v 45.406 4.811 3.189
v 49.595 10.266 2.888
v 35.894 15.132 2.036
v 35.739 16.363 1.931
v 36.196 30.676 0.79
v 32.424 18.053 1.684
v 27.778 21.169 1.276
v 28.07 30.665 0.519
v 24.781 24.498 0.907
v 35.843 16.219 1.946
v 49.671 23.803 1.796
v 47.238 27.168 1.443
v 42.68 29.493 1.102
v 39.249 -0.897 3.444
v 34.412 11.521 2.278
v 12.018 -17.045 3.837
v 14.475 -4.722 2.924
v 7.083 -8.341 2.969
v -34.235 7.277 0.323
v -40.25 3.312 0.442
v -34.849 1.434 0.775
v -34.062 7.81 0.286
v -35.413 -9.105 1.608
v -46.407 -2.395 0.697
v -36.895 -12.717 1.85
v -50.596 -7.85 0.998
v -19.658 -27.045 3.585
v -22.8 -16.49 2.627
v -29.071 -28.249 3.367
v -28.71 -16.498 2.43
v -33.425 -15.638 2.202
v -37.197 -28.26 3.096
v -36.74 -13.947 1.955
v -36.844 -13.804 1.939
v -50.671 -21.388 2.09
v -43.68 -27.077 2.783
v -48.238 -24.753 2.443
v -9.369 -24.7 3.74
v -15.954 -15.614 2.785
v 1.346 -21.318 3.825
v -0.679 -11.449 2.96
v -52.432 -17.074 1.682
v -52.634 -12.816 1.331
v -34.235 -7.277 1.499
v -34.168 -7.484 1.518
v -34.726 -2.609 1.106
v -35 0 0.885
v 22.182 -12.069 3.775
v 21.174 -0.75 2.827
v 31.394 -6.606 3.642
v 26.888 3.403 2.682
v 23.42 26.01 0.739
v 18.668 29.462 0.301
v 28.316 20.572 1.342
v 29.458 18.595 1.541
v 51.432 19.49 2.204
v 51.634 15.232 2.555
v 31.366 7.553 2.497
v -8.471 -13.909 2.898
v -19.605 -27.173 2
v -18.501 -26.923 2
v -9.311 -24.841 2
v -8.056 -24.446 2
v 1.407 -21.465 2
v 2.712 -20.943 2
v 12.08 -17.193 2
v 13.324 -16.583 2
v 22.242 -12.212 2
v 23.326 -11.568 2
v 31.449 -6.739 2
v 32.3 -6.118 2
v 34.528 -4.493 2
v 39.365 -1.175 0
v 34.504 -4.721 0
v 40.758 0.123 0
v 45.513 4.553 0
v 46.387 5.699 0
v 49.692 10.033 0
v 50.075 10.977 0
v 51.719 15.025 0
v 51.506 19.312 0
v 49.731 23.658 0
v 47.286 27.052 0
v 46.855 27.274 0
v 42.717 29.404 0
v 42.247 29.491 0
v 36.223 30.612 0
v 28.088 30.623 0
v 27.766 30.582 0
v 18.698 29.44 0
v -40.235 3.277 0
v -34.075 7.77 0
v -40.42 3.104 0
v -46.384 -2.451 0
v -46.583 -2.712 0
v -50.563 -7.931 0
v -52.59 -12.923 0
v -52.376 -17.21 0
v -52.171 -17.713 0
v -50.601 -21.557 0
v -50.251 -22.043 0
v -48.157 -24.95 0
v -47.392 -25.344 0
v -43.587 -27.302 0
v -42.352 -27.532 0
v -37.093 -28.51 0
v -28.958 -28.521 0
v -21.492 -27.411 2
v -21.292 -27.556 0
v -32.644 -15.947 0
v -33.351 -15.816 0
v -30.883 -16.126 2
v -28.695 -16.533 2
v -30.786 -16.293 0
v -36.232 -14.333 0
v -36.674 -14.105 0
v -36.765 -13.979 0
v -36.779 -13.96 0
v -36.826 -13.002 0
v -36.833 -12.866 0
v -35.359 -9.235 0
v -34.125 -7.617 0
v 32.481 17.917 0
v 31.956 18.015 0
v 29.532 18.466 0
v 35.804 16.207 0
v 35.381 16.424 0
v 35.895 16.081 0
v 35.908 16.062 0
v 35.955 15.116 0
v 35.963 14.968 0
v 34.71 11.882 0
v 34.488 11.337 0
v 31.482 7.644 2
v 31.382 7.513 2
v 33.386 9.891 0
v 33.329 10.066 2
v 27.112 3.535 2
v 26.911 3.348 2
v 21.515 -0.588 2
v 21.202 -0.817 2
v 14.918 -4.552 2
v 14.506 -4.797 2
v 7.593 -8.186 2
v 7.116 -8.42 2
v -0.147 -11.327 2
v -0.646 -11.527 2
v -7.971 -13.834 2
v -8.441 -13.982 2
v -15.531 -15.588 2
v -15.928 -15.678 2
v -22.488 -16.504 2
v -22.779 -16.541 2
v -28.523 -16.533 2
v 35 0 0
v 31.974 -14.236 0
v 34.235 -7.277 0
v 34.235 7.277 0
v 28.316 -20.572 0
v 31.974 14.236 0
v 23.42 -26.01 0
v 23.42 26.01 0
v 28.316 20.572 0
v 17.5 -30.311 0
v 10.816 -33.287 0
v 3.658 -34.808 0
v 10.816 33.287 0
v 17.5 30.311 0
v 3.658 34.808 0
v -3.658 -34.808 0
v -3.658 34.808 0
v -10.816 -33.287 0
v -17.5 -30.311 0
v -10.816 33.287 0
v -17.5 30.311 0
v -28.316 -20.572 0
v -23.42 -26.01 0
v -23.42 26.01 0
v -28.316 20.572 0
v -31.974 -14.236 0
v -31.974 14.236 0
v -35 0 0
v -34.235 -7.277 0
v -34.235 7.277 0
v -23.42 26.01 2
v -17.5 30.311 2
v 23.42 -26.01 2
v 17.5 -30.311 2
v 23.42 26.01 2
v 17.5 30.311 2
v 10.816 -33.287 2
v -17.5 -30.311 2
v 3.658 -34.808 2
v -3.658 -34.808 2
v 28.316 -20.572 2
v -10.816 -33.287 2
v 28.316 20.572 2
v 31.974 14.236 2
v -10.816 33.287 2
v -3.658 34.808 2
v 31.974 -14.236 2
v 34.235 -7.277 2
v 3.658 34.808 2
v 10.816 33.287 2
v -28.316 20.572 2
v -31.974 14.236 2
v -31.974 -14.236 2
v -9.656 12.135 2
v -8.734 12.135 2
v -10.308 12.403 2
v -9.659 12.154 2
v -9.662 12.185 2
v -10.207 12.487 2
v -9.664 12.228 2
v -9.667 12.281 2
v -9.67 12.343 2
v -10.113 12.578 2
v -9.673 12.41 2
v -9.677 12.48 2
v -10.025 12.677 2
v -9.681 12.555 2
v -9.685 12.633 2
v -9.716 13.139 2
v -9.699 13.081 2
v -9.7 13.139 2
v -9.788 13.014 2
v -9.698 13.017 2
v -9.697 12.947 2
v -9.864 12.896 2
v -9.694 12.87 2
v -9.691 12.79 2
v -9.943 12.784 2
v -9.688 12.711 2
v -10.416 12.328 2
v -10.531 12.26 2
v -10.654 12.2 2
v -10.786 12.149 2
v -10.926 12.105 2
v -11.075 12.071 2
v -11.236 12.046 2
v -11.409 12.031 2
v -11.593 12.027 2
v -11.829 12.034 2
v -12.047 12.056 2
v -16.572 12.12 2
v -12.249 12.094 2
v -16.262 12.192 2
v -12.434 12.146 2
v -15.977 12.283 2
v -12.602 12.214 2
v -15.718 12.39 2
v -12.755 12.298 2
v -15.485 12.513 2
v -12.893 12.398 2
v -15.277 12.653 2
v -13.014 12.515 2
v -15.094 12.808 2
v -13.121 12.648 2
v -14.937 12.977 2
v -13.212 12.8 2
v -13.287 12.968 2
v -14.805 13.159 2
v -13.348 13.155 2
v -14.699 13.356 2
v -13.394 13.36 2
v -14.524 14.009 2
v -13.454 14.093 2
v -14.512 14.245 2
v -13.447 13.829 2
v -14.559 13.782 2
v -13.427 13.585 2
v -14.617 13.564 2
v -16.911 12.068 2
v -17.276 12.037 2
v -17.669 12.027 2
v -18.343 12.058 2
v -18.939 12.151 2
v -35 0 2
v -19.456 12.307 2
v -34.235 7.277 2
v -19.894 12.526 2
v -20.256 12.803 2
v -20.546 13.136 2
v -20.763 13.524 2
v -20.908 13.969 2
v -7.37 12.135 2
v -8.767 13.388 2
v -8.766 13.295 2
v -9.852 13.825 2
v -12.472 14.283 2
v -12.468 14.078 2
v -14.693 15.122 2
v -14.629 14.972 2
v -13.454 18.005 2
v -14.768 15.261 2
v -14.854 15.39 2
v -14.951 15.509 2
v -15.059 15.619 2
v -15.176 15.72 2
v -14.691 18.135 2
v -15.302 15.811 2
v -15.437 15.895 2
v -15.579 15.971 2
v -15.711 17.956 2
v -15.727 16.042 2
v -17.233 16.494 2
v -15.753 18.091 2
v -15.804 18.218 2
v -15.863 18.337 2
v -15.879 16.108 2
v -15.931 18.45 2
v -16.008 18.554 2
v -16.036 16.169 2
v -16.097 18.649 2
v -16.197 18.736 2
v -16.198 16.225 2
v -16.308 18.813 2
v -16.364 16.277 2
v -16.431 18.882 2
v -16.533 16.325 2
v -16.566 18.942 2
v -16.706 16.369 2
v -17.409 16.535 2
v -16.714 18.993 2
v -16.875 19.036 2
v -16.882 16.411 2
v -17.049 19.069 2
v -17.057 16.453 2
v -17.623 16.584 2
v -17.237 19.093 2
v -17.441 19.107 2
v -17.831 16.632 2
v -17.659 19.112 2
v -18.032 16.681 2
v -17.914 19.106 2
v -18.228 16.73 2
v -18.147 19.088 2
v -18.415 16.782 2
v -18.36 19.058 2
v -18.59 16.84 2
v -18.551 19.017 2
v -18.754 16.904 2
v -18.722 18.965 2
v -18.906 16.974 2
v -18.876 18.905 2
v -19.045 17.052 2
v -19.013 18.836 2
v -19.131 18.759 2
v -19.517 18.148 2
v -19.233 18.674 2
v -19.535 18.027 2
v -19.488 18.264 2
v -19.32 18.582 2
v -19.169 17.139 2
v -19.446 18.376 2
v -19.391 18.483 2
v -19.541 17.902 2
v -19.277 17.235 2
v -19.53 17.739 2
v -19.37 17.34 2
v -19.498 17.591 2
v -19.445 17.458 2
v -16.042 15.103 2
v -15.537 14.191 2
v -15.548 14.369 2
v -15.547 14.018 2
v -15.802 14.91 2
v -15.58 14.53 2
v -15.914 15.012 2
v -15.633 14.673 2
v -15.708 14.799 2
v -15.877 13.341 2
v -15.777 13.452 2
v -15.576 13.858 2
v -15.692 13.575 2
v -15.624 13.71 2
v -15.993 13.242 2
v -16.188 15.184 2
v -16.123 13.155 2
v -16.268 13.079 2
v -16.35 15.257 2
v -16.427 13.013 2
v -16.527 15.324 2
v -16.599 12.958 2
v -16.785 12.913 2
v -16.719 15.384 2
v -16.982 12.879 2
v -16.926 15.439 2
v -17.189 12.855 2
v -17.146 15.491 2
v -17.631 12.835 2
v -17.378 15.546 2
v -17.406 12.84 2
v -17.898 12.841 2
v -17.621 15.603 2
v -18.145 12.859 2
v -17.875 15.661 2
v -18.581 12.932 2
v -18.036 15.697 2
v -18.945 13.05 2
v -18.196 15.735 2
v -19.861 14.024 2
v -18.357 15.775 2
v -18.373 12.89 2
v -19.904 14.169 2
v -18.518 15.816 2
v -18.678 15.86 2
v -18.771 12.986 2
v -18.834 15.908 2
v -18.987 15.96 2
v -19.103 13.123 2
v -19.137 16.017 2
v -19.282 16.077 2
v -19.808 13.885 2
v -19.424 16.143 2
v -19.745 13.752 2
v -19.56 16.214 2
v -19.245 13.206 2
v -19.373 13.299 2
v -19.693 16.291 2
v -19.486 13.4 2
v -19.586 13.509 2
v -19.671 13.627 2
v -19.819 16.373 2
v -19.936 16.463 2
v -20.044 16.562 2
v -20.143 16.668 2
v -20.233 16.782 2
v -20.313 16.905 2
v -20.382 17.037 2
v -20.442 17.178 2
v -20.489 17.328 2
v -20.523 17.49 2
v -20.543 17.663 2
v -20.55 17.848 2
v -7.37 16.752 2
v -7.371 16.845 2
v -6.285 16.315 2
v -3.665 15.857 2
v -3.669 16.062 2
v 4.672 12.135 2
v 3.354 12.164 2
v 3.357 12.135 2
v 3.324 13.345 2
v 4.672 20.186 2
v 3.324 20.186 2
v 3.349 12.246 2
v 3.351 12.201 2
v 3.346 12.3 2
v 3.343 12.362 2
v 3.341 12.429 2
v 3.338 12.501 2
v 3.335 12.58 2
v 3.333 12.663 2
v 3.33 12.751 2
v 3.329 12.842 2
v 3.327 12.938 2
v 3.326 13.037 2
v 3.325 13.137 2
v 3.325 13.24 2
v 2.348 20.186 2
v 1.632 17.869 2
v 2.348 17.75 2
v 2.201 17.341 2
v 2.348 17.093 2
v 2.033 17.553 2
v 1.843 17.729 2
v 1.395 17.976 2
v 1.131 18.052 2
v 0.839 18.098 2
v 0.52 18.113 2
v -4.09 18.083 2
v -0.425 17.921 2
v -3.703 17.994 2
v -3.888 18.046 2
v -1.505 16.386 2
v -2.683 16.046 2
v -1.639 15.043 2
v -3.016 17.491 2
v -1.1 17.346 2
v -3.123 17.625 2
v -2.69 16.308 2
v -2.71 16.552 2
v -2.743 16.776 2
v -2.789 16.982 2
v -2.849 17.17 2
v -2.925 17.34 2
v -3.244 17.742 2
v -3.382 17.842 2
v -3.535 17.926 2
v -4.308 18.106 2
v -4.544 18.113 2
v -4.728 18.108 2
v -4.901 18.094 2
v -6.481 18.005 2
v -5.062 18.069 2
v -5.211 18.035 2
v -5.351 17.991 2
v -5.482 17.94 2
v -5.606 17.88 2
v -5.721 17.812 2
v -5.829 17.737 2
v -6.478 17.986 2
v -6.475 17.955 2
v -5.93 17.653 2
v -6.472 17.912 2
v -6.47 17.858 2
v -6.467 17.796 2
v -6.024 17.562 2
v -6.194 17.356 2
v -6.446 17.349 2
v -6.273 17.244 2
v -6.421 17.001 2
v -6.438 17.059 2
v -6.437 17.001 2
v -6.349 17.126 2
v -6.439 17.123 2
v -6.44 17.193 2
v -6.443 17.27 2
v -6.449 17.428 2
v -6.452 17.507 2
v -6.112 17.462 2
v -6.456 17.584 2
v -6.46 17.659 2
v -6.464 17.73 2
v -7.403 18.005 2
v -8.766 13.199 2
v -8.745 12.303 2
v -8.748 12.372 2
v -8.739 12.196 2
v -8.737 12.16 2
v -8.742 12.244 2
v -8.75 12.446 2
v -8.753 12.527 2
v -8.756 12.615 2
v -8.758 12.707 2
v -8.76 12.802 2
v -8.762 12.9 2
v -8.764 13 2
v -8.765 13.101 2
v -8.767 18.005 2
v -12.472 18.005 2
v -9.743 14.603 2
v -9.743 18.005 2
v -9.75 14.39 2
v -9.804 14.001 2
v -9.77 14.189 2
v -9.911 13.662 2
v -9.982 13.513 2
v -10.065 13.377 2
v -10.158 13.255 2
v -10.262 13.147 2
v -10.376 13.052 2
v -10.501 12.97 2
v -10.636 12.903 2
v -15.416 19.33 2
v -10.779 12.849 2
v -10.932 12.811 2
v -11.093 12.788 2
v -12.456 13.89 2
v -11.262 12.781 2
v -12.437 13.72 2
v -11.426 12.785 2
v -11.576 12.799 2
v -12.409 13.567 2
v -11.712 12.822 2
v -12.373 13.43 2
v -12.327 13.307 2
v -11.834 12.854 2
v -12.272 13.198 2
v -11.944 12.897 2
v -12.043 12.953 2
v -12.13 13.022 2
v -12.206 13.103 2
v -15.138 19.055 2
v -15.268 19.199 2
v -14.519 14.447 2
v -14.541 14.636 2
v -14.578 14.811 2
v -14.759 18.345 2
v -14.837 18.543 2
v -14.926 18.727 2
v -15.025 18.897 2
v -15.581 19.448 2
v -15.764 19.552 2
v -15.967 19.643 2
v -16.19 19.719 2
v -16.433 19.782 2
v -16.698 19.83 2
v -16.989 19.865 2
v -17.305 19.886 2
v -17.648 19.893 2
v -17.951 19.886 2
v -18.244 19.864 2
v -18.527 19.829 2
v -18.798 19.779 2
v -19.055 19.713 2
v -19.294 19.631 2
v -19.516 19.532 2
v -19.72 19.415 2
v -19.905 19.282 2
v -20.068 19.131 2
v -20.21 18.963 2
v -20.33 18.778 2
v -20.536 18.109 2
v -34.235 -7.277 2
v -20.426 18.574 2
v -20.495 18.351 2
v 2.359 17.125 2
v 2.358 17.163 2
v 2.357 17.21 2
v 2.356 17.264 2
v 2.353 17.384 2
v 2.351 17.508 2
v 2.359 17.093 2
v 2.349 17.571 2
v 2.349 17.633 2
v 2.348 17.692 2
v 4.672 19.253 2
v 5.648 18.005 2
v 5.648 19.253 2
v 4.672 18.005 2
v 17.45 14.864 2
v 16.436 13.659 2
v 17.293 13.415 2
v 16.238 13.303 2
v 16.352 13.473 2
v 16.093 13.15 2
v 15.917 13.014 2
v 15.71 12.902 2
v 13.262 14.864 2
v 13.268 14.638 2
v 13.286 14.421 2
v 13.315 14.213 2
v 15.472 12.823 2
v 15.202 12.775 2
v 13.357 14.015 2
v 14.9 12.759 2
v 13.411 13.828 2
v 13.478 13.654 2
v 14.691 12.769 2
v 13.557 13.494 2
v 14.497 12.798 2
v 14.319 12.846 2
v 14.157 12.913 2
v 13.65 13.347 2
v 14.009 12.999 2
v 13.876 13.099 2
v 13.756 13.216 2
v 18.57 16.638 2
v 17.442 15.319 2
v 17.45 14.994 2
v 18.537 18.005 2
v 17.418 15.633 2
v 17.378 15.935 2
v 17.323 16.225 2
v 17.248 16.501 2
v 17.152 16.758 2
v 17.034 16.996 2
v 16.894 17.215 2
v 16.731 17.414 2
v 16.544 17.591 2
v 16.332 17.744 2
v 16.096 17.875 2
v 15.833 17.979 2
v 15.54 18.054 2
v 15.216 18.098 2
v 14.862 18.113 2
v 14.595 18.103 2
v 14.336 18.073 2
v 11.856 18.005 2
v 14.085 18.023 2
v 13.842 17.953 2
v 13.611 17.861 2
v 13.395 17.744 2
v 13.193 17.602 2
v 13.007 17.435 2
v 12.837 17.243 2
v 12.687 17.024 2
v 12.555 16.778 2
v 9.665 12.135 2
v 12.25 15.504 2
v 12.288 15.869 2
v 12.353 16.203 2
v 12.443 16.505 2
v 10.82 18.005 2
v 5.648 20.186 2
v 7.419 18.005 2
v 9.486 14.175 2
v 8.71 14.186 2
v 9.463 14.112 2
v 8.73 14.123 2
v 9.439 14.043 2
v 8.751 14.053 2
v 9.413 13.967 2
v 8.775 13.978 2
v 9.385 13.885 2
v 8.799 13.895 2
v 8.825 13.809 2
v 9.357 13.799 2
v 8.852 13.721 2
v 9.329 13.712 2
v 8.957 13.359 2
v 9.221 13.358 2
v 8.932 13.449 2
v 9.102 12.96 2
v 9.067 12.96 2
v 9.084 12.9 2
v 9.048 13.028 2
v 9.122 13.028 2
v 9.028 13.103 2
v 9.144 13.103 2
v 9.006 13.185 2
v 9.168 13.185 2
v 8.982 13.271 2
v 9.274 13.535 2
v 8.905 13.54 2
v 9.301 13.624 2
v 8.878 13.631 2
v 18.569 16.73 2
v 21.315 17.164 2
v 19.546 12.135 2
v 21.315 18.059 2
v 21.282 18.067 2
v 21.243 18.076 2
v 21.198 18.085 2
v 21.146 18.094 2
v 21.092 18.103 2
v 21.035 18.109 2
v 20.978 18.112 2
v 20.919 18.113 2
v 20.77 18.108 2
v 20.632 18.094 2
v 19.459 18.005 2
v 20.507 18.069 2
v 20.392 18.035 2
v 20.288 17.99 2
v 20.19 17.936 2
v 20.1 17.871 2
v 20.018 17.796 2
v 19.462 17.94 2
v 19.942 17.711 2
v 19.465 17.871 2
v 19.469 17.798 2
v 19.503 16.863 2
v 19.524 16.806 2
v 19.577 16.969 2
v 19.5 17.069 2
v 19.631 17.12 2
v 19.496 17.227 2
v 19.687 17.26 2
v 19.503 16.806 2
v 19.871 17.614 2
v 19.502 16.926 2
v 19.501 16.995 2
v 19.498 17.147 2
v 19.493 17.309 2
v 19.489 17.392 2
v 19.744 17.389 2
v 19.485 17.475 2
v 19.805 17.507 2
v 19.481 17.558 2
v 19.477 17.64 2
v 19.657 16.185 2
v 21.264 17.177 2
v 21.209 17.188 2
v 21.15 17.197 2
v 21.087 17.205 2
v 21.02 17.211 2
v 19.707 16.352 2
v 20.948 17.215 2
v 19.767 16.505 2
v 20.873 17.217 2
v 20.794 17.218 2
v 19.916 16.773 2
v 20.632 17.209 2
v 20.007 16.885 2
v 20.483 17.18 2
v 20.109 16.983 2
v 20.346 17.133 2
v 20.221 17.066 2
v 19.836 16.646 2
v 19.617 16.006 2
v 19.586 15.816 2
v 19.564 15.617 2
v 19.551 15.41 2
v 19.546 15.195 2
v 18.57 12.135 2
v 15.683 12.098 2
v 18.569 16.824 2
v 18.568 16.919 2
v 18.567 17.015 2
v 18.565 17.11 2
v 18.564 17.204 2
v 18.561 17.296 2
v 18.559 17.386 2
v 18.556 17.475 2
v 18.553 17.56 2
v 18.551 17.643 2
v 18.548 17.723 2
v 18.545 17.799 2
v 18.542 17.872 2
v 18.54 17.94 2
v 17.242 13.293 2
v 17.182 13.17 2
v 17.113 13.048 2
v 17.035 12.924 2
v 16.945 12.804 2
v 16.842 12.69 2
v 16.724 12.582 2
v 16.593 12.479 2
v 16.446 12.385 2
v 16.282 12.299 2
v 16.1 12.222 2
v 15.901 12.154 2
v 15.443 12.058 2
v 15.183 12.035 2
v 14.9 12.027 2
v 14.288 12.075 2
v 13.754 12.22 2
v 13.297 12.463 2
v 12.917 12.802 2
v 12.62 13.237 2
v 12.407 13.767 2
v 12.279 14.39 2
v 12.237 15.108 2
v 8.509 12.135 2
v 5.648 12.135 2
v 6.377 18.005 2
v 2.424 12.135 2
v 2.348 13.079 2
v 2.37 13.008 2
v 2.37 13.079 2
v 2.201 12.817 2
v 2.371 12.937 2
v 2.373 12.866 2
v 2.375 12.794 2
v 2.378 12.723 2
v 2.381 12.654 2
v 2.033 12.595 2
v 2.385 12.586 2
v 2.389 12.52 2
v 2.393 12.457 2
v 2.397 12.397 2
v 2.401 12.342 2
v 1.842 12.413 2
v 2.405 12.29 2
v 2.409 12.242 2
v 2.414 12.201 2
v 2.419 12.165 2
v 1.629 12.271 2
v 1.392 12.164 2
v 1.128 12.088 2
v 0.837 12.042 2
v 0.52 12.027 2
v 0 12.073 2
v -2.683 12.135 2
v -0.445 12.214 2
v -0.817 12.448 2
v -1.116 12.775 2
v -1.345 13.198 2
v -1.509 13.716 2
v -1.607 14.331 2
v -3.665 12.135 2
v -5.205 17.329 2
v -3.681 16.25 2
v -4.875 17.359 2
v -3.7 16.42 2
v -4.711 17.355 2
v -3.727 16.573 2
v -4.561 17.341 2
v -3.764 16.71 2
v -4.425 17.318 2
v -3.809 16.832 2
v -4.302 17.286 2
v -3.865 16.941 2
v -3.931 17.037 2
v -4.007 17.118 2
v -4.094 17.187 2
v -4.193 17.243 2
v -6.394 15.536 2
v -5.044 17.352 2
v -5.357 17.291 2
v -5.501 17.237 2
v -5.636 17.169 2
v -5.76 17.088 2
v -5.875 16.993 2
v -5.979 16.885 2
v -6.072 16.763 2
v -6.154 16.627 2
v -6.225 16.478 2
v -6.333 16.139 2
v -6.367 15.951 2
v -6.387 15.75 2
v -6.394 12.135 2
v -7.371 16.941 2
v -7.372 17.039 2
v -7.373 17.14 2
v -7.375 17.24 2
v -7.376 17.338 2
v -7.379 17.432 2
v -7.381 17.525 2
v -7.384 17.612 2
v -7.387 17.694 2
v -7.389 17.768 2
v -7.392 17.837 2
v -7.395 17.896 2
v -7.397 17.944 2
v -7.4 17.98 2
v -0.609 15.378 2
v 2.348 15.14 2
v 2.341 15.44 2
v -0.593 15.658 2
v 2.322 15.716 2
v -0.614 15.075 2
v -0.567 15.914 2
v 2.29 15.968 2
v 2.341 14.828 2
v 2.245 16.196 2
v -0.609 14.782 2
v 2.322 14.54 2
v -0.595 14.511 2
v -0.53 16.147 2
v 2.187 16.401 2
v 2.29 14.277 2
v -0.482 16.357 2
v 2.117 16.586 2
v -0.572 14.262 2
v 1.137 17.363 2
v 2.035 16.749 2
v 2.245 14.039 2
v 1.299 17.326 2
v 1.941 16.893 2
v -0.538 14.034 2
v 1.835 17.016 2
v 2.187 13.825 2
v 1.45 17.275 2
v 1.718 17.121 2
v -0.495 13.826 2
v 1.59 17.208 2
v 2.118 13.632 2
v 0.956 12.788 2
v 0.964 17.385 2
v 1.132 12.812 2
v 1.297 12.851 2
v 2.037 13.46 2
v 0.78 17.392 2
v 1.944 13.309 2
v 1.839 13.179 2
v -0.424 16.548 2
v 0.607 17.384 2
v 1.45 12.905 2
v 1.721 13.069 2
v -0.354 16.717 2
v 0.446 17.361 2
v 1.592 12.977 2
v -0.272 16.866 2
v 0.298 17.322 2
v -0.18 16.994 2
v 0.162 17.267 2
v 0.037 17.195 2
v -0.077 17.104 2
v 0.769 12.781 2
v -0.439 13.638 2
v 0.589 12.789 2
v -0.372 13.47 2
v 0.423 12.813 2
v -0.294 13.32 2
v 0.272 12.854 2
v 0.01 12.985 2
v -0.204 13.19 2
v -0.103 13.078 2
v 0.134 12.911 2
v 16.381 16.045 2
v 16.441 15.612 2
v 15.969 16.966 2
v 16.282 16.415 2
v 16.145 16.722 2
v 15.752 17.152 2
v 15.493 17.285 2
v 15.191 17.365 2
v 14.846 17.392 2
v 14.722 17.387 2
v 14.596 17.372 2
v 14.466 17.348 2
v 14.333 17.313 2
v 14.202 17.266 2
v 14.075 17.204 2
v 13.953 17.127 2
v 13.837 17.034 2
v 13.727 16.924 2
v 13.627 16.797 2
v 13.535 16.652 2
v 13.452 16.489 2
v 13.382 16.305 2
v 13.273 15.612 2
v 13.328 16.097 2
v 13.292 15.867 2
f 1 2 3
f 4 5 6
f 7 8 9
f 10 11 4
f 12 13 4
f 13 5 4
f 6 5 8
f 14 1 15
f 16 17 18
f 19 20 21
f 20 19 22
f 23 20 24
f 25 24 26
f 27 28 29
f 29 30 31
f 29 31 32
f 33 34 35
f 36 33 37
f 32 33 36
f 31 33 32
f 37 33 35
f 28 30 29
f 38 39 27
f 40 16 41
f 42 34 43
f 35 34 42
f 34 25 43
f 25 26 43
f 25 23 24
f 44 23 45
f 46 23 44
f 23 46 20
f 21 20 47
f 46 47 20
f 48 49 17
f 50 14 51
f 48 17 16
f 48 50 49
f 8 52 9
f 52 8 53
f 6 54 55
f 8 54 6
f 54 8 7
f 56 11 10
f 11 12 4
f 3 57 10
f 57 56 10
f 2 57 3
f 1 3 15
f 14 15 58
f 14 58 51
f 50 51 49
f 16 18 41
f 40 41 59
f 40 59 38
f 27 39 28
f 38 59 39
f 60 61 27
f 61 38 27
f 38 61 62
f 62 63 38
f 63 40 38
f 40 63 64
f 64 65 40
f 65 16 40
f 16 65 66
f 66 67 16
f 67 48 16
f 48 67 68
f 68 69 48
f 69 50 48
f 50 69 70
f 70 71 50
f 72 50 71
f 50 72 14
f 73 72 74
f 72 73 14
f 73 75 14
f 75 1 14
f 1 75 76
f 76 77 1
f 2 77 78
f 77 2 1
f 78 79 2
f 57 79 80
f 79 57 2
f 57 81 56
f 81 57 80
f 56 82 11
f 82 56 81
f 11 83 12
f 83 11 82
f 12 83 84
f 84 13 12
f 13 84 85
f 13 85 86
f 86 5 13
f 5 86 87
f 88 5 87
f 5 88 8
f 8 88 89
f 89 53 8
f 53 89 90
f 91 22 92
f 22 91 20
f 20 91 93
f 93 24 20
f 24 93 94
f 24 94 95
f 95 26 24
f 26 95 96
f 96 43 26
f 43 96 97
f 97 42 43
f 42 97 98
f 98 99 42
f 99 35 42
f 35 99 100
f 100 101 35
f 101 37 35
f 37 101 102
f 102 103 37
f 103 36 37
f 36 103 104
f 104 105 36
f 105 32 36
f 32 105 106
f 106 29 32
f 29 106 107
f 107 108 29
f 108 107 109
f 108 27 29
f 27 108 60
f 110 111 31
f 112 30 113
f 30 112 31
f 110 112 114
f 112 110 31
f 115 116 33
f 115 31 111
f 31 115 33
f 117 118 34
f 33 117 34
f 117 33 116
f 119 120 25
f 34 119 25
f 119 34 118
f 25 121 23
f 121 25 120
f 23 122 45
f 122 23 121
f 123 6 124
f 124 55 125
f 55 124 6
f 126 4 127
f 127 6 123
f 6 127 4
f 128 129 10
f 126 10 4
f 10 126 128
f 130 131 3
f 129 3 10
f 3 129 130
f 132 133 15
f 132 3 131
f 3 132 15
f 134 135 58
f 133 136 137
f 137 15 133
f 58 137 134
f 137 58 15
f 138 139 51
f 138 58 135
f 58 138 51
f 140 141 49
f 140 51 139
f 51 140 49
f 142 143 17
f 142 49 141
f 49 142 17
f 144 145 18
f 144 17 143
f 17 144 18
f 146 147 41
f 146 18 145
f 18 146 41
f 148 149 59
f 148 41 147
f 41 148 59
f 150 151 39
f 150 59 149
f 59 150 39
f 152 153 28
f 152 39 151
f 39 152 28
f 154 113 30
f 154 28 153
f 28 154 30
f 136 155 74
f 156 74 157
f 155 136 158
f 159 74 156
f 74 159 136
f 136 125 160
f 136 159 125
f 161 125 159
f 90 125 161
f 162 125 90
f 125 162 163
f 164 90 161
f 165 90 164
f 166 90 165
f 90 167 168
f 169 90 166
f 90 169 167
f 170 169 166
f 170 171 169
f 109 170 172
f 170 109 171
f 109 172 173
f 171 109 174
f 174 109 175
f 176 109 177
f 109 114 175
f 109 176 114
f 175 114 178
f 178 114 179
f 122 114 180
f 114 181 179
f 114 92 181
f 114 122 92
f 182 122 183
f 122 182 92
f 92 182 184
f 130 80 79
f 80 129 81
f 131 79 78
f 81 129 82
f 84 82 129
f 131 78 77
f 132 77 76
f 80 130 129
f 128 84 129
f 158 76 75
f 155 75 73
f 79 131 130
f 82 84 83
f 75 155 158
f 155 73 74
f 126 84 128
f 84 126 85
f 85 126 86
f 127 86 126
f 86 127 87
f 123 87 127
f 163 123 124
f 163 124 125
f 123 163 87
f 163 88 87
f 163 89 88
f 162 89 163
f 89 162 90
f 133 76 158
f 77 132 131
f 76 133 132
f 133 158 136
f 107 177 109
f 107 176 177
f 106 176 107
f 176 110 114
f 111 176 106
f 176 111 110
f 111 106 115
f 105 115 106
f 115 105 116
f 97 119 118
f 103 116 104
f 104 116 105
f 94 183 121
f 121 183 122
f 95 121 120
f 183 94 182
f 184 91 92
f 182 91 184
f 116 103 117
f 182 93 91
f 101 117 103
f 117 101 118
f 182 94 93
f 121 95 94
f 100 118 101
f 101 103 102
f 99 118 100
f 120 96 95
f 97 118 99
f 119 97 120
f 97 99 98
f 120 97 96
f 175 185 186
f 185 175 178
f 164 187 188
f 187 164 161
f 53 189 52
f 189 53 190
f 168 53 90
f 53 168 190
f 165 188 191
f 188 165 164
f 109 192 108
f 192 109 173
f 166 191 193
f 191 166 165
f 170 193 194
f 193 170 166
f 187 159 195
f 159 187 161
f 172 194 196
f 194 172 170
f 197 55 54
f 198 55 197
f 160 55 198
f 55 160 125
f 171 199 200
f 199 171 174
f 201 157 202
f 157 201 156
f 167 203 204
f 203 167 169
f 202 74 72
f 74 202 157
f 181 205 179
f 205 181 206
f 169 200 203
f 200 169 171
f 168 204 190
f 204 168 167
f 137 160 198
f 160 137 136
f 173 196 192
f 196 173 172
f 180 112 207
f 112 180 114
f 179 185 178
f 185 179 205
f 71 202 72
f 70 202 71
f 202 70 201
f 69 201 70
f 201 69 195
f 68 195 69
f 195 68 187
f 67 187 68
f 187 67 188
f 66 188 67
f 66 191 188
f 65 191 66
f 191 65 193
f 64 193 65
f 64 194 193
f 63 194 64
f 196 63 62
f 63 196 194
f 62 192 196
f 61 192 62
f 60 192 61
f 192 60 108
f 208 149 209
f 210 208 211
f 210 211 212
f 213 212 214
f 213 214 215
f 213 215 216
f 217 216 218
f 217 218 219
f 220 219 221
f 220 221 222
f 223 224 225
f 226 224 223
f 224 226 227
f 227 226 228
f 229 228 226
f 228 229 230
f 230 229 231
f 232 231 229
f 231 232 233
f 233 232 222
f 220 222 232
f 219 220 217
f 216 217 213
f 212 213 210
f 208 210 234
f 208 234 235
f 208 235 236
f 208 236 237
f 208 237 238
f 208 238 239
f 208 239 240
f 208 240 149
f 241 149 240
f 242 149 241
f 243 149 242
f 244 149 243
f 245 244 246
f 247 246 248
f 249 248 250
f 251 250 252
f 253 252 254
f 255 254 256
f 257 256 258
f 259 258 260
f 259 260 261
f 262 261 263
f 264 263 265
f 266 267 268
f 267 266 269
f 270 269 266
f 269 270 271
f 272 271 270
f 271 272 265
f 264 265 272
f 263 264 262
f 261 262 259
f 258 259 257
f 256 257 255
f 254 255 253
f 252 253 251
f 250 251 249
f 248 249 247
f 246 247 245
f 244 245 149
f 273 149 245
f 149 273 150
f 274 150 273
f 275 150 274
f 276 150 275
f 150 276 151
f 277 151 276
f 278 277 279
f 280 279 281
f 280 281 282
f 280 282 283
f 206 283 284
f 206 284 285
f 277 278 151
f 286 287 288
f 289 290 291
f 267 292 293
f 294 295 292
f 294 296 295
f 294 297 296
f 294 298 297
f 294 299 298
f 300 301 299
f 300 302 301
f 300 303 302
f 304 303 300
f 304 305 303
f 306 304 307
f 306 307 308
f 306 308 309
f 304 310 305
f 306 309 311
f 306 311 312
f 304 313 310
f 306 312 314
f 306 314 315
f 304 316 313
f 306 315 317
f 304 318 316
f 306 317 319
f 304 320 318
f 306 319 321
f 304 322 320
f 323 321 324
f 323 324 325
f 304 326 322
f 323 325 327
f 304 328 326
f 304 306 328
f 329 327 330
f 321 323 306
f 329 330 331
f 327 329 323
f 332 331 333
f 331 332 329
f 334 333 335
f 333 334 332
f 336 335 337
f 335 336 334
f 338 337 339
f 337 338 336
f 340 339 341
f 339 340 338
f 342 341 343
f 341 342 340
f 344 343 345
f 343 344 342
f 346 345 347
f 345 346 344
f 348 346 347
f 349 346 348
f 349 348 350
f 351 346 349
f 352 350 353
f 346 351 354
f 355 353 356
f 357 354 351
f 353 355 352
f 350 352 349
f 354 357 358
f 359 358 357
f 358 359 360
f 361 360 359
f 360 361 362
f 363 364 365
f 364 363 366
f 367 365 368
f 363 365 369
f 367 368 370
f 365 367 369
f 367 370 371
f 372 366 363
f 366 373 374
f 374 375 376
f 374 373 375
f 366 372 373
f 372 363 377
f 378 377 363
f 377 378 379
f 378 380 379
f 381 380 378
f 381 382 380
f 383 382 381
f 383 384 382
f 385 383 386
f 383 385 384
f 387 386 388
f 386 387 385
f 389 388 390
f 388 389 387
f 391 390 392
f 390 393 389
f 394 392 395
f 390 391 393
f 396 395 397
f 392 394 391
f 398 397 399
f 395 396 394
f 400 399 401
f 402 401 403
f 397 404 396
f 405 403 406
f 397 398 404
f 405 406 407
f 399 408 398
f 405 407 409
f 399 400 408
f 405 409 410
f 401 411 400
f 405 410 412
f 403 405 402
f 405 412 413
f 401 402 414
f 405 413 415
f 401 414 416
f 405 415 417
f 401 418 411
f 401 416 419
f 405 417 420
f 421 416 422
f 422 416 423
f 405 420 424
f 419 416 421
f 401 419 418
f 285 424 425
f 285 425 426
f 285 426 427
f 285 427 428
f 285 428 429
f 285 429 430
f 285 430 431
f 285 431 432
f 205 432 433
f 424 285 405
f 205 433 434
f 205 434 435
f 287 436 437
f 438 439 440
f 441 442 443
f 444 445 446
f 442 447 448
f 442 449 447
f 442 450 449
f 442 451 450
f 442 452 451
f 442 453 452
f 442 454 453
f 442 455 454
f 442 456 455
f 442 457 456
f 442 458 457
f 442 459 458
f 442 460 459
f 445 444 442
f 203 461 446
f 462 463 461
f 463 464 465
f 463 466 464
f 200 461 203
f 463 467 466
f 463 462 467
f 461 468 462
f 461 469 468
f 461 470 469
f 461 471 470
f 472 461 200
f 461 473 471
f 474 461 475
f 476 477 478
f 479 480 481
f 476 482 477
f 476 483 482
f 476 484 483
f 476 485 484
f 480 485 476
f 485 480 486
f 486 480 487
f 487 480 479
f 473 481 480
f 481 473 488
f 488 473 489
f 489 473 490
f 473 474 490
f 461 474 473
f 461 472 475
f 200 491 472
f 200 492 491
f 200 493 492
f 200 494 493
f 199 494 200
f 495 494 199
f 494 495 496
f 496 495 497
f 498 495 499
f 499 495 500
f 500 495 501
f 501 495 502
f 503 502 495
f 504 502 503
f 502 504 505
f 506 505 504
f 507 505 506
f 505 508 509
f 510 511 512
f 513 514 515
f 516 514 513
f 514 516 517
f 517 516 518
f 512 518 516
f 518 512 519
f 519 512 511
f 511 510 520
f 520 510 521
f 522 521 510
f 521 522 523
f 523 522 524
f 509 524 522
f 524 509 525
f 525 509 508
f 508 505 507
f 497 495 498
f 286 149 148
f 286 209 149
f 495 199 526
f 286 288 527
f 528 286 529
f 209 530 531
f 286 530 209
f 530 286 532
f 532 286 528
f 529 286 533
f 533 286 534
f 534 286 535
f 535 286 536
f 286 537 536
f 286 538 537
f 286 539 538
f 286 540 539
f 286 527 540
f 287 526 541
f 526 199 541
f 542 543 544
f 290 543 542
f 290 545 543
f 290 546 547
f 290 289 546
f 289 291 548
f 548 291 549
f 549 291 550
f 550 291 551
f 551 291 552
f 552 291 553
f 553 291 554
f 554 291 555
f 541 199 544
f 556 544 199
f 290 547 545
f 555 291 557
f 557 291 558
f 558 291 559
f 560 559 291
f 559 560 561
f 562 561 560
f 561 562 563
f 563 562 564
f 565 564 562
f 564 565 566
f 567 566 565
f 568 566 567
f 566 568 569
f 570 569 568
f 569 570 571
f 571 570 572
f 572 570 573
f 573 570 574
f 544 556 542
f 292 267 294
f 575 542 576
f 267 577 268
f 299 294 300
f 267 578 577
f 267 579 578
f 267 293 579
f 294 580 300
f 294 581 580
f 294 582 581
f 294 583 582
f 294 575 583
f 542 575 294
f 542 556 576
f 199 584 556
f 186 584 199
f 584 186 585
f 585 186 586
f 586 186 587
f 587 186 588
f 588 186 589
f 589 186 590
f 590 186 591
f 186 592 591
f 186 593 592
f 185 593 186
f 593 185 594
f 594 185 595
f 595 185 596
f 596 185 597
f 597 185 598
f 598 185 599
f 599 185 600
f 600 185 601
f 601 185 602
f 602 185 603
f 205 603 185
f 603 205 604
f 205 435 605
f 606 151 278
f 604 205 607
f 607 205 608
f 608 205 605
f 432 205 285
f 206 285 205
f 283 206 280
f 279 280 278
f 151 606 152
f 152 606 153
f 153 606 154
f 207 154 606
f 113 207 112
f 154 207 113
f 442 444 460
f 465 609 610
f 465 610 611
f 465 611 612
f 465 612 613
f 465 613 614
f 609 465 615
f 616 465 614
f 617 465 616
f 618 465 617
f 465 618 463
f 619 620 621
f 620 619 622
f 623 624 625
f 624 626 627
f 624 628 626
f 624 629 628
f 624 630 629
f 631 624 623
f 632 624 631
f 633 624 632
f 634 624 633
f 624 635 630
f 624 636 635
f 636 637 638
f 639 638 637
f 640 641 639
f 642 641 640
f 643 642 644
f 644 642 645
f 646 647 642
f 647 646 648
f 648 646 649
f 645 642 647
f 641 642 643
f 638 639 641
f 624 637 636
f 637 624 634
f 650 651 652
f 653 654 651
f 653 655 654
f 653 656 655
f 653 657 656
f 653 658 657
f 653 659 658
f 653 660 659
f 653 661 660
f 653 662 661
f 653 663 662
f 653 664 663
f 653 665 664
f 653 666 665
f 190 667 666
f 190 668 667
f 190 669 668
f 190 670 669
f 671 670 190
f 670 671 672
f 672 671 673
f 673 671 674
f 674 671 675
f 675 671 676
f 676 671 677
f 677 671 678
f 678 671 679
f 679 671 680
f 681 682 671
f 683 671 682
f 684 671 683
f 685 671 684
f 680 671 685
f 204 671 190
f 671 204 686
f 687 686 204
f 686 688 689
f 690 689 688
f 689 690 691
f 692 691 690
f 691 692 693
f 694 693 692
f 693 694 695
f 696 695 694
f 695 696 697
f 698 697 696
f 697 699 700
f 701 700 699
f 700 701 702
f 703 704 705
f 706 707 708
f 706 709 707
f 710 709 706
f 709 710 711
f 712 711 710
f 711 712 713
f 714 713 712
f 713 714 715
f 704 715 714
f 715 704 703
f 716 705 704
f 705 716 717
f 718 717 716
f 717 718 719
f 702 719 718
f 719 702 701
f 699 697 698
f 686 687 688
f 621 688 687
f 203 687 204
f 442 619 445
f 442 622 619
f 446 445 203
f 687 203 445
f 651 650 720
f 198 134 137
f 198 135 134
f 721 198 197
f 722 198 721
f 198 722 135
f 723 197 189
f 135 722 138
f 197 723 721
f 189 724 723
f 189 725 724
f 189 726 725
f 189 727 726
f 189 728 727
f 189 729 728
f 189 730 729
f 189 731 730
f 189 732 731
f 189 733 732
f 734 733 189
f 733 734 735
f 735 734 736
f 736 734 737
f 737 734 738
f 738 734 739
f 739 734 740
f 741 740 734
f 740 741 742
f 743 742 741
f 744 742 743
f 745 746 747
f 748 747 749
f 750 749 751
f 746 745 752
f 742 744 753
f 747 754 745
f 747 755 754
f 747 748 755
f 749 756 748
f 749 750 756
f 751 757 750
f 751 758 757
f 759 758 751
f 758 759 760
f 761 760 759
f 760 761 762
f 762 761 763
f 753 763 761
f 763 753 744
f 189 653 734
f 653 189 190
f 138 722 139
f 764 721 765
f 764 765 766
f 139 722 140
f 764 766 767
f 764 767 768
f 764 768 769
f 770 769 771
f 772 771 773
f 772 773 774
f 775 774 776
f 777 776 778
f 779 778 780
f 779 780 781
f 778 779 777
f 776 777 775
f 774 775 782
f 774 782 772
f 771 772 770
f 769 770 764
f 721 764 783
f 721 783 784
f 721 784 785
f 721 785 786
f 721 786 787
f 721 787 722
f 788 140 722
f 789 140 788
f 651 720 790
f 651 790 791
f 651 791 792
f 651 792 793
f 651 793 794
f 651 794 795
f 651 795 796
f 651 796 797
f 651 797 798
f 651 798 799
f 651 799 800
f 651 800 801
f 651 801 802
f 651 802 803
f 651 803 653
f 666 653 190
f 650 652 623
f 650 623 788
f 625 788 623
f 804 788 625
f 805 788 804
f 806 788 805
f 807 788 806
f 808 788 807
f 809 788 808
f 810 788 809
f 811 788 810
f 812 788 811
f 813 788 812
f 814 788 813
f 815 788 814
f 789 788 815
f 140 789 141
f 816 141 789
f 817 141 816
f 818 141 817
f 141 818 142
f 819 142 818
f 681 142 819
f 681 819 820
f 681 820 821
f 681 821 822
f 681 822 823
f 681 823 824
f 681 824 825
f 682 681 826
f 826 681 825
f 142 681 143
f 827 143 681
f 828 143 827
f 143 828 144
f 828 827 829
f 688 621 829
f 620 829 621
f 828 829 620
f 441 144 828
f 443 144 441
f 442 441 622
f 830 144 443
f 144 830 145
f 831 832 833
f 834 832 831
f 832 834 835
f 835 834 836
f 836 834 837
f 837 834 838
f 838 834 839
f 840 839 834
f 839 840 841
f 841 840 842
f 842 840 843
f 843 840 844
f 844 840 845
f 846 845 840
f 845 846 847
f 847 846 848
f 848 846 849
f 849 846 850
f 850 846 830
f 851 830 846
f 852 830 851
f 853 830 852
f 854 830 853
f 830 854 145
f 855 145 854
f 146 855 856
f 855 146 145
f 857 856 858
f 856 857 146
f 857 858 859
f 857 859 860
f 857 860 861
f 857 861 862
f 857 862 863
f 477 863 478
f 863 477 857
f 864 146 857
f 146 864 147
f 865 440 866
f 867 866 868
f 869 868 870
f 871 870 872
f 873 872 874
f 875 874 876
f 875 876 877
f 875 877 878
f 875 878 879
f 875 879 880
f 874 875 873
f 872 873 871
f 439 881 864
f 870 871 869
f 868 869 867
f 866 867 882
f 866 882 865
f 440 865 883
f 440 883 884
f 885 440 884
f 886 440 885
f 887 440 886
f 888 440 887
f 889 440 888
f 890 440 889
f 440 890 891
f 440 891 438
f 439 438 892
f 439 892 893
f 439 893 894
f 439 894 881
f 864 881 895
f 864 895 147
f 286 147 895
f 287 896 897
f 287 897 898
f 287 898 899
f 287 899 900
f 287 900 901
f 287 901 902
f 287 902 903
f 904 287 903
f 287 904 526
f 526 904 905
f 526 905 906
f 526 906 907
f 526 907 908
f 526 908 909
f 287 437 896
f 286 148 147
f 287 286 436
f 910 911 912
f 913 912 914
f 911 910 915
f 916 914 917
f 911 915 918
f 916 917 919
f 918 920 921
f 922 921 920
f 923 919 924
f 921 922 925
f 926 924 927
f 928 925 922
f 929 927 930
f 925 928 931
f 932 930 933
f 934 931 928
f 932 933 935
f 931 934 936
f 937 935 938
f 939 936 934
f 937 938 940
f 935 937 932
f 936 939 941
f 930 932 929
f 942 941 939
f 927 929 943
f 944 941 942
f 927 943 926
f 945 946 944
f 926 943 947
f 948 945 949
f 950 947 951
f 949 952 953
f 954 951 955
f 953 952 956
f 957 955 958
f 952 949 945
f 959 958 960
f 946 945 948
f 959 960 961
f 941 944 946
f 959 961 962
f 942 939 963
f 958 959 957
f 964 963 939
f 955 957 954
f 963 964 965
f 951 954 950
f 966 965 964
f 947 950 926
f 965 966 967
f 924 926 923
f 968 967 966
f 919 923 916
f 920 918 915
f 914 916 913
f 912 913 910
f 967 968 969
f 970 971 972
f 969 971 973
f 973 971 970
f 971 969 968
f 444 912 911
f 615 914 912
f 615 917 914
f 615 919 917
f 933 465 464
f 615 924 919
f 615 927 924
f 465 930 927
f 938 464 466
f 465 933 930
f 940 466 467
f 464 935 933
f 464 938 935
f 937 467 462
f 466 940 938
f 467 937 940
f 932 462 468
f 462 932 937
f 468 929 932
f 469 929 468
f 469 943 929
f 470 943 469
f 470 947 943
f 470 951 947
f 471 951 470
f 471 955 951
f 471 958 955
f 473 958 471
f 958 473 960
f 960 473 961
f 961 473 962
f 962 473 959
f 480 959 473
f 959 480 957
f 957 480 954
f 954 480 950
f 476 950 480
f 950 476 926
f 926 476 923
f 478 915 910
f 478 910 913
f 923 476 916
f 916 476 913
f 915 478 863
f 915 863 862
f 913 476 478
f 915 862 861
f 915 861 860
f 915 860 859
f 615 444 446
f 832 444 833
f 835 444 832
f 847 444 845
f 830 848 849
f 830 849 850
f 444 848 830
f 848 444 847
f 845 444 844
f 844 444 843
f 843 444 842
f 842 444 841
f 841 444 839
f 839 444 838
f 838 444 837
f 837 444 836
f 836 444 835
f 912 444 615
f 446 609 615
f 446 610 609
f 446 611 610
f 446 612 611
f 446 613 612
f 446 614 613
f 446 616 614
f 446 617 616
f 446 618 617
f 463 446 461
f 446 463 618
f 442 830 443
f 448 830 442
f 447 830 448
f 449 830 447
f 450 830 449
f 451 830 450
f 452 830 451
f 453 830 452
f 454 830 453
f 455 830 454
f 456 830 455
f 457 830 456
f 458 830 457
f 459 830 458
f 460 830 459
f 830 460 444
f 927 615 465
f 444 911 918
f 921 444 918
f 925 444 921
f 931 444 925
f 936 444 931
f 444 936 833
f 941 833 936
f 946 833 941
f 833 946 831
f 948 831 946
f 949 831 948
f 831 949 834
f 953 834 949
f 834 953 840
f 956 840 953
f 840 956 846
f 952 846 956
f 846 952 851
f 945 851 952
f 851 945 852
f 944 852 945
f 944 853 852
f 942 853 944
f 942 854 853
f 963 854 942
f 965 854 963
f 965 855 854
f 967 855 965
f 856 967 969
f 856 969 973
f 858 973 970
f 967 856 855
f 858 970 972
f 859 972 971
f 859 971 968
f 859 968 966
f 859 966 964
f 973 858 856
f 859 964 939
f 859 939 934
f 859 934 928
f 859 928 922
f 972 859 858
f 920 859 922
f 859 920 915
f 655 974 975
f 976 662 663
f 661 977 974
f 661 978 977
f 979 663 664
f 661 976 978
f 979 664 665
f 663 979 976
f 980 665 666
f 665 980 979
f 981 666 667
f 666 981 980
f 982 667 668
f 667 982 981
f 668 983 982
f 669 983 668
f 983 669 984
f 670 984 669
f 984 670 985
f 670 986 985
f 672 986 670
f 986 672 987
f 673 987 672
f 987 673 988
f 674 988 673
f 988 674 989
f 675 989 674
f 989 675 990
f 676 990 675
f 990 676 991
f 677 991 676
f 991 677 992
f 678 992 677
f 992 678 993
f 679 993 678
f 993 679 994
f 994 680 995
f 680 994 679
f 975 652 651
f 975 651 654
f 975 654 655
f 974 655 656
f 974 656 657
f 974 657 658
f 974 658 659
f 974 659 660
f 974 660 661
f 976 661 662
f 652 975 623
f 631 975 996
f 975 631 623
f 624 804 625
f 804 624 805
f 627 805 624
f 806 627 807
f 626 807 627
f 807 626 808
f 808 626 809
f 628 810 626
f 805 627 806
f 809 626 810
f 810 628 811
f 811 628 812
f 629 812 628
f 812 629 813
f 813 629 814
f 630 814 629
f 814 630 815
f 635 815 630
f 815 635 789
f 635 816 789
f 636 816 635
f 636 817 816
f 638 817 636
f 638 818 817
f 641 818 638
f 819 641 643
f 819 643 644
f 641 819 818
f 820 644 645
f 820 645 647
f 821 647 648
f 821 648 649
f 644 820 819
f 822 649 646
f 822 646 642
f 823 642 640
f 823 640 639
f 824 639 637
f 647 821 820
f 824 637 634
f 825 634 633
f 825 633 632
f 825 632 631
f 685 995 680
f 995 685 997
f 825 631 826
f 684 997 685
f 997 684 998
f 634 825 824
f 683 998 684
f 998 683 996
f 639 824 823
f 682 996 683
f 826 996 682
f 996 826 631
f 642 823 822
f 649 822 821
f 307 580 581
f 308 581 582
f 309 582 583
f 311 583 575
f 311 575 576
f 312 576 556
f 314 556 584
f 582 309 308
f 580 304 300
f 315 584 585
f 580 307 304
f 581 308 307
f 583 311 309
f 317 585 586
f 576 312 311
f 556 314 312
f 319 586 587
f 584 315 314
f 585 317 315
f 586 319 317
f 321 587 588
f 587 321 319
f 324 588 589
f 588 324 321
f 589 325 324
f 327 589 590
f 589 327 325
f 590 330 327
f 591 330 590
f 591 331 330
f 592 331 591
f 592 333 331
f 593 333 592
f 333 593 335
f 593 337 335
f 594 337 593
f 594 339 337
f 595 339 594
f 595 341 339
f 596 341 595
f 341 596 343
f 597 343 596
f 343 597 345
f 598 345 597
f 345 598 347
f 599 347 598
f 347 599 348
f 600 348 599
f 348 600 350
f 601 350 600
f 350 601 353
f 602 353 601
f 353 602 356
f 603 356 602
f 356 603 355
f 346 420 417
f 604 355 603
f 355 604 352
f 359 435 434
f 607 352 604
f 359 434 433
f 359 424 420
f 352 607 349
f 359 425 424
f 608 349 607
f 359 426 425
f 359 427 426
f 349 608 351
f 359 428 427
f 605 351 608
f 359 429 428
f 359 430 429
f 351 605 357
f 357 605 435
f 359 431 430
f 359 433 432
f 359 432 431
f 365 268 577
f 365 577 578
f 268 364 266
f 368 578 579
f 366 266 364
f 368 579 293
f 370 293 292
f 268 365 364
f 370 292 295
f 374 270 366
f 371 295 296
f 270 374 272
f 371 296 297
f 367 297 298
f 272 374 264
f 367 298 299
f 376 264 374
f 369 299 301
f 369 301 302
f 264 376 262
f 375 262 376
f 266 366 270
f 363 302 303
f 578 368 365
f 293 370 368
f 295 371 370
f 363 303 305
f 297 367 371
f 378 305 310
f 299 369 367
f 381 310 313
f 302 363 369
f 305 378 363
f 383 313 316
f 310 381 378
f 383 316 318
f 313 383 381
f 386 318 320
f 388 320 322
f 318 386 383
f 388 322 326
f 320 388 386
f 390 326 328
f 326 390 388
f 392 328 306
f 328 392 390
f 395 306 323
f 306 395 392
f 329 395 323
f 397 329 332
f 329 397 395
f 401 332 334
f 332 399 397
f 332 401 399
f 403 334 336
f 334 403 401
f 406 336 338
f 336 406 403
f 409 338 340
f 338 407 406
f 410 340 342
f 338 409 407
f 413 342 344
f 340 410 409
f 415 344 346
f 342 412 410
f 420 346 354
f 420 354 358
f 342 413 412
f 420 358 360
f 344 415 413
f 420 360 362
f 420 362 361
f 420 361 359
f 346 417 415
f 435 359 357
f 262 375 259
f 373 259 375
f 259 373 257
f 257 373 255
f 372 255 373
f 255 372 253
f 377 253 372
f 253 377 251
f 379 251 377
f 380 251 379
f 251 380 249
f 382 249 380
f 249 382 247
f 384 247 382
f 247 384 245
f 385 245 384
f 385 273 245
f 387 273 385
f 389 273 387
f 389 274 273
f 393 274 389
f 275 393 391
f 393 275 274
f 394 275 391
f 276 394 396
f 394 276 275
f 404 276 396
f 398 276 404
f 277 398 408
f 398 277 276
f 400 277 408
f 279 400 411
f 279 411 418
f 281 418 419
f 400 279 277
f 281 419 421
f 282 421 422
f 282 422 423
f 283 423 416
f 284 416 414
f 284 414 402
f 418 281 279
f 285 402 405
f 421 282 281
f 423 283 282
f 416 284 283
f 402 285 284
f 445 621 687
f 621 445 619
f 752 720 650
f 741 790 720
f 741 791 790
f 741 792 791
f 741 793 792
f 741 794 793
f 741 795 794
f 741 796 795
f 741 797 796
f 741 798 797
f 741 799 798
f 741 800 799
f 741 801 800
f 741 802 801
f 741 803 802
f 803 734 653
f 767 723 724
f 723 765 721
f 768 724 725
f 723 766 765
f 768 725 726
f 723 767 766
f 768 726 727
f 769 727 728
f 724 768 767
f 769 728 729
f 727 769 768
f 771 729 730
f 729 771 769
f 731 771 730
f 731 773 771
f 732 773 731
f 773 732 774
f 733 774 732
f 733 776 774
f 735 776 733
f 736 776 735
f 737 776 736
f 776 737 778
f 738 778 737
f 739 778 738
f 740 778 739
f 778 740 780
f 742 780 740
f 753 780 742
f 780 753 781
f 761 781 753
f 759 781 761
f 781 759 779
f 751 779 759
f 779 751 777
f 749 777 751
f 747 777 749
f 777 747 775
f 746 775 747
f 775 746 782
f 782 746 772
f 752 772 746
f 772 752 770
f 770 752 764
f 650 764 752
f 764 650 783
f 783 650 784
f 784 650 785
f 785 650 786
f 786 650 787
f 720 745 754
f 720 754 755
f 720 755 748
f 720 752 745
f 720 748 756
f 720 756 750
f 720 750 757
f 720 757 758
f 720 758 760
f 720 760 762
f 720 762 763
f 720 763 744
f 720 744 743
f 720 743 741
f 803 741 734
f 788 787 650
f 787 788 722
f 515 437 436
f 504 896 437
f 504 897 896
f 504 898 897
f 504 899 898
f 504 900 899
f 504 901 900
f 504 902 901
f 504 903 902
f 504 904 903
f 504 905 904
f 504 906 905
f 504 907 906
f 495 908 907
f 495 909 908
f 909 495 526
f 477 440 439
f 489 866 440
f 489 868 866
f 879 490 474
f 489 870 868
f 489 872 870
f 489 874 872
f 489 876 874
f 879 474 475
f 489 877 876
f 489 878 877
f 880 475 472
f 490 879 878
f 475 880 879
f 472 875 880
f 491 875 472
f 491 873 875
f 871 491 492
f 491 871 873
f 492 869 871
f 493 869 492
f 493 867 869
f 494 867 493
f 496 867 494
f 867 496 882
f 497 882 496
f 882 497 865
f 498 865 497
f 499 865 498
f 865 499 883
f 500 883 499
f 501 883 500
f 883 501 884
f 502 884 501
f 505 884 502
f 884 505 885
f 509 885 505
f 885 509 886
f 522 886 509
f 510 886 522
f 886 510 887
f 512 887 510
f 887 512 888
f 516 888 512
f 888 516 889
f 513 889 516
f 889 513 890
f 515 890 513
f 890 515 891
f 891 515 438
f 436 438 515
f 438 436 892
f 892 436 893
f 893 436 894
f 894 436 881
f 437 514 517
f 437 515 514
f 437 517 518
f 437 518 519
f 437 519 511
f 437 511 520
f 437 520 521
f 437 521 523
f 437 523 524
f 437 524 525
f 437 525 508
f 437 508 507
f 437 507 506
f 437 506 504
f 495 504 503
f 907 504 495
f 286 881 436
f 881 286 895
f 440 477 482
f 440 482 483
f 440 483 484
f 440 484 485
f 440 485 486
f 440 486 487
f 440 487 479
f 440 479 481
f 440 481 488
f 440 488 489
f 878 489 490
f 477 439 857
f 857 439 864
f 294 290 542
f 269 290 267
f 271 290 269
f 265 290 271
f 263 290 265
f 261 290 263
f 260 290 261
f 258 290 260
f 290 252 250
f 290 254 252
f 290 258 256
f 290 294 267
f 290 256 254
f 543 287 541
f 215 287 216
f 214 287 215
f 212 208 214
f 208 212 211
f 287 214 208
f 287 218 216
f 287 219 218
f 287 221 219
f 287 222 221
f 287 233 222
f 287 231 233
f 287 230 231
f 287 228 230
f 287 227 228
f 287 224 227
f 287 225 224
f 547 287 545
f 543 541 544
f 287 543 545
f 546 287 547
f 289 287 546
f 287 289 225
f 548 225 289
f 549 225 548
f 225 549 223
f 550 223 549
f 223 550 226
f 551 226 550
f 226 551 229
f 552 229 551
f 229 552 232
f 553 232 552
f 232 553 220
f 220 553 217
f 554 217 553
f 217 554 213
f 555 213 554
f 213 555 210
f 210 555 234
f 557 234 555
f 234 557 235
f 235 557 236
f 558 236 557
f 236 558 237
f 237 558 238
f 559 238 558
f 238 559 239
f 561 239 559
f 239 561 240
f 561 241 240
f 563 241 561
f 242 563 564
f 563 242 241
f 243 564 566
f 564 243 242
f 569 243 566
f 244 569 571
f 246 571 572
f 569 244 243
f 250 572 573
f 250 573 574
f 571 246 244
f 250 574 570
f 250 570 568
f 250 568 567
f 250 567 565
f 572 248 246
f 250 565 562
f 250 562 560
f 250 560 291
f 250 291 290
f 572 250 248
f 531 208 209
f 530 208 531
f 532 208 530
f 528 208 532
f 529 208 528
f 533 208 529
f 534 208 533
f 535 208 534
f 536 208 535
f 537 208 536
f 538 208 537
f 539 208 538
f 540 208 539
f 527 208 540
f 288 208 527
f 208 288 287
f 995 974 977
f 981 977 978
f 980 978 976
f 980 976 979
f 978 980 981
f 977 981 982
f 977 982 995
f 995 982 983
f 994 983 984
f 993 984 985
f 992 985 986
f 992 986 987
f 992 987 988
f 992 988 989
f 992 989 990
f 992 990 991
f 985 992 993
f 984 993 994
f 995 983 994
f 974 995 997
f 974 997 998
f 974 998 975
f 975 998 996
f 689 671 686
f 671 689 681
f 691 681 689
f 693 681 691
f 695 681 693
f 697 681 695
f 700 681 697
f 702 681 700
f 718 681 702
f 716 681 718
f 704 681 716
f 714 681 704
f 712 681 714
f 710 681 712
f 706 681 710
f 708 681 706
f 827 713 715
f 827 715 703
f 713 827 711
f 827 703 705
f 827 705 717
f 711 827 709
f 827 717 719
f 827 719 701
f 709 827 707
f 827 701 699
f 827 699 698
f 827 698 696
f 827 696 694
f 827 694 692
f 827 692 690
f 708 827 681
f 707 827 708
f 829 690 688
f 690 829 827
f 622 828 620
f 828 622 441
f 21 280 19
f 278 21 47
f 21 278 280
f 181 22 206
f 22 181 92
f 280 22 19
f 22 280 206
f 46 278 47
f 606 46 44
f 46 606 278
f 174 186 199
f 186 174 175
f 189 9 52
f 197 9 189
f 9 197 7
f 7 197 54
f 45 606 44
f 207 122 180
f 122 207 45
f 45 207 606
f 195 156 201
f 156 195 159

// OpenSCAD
difference() {
	union() {
		linear_extrude(height = 2) {
			projection(cut = false) {
				translate(v = [0, 0, 200]) {
					sphere($fn = 30, r = 35);
				}
			}
		}
		difference() {
			rotate(a = [0, 0, 22.5000000000]) {
				translate(v = [0, 0, -13]) {
					rotate(a = [-5, 0, 0]) {
						rotate(a = [0, 0, -22.5000000000]) {
							linear_extrude(height = 15) {
								projection(cut = false) {
									rotate(a = [-90, 0, 0]) {
										rotate(a = [30, 0, -45]) {
											difference() {
												cylinder($fn = 30, center = true, h = 5, r = 55);
												cylinder($fn = 30, center = true, h = 5, r = 40);
											}
										}
									}
								}
							}
						}
					}
				}
			}
			translate(v = [0, 0, -100]) {
				cube(center = true, size = 200);
			}
		}
	}
	translate(v = [0, 0, 2]) {
		linear_extrude(height = 5) {
			union() {
				translate(v = [0, 20, 0]) {
					text(halign = "center", size = 8, text = "Sundiver", valign = "top");
				}
				text(halign = "center", size = 15, text = " ", valign = "top");
			}
		}
	}
}
